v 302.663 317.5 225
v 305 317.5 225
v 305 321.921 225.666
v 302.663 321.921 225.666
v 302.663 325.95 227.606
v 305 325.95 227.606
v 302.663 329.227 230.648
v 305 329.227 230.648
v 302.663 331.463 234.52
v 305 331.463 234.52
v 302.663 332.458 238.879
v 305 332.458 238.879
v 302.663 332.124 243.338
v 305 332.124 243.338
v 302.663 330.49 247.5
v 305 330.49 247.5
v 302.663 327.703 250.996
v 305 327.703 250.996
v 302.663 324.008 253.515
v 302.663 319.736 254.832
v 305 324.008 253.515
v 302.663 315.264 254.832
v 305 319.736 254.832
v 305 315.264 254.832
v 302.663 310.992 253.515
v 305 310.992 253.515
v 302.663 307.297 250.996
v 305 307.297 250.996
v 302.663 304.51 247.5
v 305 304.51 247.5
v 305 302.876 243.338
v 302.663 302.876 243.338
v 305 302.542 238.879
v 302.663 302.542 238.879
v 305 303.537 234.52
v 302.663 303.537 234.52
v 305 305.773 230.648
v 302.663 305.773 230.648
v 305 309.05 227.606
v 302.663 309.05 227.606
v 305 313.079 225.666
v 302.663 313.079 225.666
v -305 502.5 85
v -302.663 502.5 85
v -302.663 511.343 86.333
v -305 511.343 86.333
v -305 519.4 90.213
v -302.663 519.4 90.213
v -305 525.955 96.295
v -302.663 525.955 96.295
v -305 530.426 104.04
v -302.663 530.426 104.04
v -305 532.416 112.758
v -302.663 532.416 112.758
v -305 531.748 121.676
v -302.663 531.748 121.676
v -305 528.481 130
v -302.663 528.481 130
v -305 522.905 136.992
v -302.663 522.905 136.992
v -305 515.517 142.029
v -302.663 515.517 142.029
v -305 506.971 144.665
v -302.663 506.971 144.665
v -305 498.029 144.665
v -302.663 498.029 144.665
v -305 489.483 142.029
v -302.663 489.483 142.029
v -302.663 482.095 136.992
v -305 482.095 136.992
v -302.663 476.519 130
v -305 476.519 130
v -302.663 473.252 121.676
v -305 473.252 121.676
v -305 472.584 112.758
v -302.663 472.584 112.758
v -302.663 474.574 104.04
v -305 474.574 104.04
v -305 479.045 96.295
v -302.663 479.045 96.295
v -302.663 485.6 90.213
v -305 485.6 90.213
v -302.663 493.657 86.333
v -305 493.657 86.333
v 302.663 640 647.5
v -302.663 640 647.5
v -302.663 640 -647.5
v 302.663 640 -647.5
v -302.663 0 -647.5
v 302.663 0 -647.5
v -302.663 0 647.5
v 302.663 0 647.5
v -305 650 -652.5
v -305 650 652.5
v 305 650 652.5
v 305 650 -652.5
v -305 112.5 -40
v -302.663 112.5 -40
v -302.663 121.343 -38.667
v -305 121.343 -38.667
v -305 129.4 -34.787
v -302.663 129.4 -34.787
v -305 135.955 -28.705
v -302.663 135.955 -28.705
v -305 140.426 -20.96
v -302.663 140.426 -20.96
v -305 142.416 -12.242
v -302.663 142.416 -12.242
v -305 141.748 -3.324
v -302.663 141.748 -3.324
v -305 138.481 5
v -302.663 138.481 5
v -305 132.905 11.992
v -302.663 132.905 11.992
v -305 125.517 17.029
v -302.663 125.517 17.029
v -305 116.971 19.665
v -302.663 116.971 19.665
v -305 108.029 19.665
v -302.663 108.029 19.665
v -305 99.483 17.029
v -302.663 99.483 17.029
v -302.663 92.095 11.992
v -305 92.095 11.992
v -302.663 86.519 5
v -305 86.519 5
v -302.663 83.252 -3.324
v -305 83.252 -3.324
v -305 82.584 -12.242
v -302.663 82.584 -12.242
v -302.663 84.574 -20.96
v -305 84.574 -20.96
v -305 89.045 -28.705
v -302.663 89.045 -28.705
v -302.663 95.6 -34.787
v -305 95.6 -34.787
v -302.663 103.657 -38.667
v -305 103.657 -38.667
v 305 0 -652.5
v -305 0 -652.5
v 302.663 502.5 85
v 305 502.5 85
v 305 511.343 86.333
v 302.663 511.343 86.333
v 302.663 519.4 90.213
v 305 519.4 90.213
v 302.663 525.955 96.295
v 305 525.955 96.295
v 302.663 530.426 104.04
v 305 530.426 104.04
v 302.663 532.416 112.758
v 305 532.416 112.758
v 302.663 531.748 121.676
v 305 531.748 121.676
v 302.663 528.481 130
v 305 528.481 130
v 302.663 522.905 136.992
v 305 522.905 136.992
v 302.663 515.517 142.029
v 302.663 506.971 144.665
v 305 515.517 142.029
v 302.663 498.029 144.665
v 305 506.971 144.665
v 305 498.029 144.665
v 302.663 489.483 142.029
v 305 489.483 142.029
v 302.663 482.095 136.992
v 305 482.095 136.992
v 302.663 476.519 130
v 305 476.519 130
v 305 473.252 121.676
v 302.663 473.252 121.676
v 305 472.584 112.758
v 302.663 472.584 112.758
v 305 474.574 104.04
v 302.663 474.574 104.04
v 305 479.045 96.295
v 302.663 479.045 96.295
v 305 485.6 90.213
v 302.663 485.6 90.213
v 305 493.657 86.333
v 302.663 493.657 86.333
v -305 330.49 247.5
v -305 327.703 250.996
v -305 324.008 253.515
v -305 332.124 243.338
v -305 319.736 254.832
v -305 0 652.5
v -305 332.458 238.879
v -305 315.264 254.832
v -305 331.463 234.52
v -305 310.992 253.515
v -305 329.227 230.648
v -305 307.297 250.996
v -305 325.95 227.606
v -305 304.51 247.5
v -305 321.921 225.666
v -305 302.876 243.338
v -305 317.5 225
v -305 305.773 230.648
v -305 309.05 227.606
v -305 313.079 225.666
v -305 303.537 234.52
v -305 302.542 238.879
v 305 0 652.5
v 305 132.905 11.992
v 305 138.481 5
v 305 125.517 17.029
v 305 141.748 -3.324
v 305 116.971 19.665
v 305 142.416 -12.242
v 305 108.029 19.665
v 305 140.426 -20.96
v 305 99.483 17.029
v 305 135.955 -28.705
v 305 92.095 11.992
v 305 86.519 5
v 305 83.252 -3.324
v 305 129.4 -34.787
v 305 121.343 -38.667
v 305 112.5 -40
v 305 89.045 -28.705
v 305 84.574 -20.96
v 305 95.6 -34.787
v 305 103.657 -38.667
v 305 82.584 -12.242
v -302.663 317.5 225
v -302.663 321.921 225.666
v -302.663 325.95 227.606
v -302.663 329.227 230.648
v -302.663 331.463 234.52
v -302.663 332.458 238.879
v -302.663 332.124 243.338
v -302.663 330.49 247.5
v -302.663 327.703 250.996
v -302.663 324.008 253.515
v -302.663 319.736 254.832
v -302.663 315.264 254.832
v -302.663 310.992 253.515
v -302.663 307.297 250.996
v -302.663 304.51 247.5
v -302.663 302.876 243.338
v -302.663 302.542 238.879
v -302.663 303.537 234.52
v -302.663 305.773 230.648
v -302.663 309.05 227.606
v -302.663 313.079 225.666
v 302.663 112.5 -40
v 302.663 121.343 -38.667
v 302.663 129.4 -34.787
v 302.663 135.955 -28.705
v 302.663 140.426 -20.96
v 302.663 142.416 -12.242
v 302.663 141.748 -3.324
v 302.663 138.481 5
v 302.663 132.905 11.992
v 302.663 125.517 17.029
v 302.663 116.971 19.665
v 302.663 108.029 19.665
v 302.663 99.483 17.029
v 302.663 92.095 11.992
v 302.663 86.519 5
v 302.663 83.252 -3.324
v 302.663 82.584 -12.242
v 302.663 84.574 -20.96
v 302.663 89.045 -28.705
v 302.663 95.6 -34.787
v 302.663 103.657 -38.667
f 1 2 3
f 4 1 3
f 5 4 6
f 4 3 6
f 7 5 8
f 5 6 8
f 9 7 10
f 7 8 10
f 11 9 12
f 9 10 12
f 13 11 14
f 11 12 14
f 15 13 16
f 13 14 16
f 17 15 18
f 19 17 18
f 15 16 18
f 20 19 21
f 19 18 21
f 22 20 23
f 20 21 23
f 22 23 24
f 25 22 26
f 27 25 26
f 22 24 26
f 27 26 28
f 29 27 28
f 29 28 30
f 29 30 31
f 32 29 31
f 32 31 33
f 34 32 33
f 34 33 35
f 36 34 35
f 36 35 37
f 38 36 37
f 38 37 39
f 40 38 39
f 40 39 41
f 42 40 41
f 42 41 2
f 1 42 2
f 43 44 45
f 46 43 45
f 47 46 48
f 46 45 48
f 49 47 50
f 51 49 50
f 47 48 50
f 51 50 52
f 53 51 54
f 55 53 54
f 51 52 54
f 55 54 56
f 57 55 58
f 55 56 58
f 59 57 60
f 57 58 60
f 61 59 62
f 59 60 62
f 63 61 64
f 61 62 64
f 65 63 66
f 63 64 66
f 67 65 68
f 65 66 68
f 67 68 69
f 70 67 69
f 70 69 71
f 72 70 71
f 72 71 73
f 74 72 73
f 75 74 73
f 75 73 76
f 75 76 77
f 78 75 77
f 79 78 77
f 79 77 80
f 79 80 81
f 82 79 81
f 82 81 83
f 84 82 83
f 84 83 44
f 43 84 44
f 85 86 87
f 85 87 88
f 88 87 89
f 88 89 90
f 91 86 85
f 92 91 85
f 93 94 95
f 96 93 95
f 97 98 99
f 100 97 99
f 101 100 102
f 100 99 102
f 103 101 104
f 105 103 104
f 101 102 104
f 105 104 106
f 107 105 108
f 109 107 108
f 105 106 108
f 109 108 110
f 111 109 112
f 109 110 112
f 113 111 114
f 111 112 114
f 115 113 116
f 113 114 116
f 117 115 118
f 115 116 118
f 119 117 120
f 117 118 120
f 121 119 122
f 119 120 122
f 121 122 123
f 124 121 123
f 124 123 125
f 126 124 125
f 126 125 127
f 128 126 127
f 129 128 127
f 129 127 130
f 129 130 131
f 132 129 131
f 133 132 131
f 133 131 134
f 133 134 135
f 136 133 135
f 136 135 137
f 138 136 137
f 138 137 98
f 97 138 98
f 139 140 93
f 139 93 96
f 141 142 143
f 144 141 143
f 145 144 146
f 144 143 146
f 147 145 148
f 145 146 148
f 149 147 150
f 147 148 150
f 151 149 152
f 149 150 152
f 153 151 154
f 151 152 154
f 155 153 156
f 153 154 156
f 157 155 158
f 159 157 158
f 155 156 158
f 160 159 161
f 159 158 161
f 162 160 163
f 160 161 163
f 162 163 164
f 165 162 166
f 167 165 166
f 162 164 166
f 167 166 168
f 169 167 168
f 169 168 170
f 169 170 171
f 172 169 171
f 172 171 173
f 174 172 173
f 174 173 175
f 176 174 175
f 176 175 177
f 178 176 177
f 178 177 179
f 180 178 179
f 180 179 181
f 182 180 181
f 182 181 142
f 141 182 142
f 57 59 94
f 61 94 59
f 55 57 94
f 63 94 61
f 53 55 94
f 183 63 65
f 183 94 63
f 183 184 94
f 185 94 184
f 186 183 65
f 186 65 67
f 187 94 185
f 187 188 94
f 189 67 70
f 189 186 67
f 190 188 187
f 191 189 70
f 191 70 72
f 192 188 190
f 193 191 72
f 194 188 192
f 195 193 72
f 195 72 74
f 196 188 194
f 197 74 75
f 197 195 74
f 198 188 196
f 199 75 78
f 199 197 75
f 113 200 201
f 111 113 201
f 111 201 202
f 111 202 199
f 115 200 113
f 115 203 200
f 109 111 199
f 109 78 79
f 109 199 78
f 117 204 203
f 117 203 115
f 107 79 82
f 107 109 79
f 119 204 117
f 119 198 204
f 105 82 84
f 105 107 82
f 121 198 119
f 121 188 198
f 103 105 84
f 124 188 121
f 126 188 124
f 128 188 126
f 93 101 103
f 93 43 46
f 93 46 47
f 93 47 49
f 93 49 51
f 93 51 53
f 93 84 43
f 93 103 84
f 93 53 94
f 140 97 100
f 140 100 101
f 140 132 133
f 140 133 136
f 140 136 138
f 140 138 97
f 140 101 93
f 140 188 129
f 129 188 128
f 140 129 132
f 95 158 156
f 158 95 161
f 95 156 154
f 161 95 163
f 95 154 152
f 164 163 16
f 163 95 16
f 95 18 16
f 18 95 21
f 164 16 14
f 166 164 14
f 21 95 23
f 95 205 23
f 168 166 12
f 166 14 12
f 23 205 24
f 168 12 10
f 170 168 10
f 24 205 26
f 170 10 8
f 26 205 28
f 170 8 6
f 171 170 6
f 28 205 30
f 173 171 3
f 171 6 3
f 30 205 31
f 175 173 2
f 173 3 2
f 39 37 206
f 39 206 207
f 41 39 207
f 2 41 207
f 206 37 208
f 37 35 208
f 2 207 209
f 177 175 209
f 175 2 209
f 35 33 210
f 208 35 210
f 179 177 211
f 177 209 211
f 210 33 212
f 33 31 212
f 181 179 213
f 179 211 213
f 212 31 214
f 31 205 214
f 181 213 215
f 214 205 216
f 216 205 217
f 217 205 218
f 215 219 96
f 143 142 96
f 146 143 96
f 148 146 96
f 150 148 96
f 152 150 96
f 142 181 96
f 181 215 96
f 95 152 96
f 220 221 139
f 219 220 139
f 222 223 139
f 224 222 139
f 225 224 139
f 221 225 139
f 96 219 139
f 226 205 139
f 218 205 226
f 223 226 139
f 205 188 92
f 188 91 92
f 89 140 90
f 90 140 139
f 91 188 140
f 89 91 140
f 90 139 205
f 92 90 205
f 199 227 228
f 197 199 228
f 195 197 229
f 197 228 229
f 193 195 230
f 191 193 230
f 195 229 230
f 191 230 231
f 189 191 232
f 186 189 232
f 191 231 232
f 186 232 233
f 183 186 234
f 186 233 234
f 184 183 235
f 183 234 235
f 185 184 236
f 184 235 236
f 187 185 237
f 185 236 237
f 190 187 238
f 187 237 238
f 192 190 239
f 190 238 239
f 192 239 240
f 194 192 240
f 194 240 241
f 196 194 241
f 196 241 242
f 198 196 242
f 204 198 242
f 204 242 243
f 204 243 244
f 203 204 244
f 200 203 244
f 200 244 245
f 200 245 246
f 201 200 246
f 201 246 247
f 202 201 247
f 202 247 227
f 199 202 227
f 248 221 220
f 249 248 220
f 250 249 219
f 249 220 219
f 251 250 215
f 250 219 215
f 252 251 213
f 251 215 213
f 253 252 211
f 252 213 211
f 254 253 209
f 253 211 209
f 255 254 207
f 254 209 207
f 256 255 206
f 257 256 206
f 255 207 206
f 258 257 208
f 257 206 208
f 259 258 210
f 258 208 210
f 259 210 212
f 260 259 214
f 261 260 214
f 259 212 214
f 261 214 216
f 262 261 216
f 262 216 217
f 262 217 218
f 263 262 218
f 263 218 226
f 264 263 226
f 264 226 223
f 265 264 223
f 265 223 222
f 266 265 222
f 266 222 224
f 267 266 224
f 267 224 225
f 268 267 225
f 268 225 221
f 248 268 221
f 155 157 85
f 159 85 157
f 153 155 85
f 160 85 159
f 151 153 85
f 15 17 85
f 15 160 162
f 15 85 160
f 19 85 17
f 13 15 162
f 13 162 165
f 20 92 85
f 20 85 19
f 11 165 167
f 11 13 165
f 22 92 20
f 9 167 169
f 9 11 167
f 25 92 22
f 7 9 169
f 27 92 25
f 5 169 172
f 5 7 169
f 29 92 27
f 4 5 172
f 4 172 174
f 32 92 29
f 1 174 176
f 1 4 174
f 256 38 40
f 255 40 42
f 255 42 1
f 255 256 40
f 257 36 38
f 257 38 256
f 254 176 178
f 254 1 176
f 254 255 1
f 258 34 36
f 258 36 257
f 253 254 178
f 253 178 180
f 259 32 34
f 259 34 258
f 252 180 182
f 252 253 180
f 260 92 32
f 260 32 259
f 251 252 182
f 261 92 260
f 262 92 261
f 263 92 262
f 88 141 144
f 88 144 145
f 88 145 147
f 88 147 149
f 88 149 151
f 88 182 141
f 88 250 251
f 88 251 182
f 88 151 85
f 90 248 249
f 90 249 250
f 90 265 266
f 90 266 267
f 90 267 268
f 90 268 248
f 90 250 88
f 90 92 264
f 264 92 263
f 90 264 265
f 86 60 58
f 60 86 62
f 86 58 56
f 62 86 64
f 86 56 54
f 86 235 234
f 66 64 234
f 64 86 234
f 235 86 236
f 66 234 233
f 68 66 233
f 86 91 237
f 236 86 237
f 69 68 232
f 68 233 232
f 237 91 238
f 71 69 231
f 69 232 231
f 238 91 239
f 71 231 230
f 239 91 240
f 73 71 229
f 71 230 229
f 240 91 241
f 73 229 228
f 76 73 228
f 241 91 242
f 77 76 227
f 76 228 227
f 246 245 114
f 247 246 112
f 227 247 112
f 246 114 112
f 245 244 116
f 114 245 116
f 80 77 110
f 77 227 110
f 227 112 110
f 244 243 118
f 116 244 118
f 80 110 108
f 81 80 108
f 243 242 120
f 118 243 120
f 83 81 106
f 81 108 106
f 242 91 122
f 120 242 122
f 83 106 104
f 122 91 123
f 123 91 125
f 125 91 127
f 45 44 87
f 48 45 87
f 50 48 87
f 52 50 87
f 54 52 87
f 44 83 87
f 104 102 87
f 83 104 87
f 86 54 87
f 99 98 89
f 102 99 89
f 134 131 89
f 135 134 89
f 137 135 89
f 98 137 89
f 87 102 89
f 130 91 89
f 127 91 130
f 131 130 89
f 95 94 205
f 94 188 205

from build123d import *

# Parameters (mm, degrees)
SKETCH3_W           = 610
SKETCH3_H           = 1305
SKETCH3_W_2         = 605.325670498
SKETCH3_H_2         = 1295
BOSS_EXTRUDE2_DEPTH = 640
SKETCH4_R           = 30
SKETCH4_R_2         = 15
CUT_EXTRUDE1_DEPTH  = 640
SKETCH5_W           = 610
SKETCH5_H           = 1305
BOSS_EXTRUDE3_DEPTH = 10


with BuildPart() as part:
    # Sketch3 → Boss-Extrude2 (new body)
    with BuildSketch(Plane(origin=(0, 0, 0), x_dir=(1, 0, 0), z_dir=(0, 1, 0))):
        Rectangle(SKETCH3_W, SKETCH3_H)
        Rectangle(SKETCH3_W_2, SKETCH3_H_2, mode=Mode.SUBTRACT)
    extrude(amount=BOSS_EXTRUDE2_DEPTH)

    # Sketch4 → Cut-Extrude1 (cut)
    with BuildSketch(Plane(origin=(305, 0, 0), x_dir=(0, 0, -1), z_dir=(1, 0, 0))):
        with Locations((-115, 502.5)):
            Circle(SKETCH4_R)
        with Locations((10, 112.5)):
            Circle(SKETCH4_R)
        with Locations((-240, 317.5)):
            Circle(SKETCH4_R_2)
    extrude(amount=-CUT_EXTRUDE1_DEPTH, mode=Mode.SUBTRACT)

    # Sketch5 → Boss-Extrude3 (add)
    with BuildSketch(Plane(origin=(0, 640, 0), x_dir=(1, 0, 0), z_dir=(0, 1, 0))):
        Rectangle(SKETCH5_W, SKETCH5_H)
    extrude(amount=BOSS_EXTRUDE3_DEPTH)


solid = part.part
